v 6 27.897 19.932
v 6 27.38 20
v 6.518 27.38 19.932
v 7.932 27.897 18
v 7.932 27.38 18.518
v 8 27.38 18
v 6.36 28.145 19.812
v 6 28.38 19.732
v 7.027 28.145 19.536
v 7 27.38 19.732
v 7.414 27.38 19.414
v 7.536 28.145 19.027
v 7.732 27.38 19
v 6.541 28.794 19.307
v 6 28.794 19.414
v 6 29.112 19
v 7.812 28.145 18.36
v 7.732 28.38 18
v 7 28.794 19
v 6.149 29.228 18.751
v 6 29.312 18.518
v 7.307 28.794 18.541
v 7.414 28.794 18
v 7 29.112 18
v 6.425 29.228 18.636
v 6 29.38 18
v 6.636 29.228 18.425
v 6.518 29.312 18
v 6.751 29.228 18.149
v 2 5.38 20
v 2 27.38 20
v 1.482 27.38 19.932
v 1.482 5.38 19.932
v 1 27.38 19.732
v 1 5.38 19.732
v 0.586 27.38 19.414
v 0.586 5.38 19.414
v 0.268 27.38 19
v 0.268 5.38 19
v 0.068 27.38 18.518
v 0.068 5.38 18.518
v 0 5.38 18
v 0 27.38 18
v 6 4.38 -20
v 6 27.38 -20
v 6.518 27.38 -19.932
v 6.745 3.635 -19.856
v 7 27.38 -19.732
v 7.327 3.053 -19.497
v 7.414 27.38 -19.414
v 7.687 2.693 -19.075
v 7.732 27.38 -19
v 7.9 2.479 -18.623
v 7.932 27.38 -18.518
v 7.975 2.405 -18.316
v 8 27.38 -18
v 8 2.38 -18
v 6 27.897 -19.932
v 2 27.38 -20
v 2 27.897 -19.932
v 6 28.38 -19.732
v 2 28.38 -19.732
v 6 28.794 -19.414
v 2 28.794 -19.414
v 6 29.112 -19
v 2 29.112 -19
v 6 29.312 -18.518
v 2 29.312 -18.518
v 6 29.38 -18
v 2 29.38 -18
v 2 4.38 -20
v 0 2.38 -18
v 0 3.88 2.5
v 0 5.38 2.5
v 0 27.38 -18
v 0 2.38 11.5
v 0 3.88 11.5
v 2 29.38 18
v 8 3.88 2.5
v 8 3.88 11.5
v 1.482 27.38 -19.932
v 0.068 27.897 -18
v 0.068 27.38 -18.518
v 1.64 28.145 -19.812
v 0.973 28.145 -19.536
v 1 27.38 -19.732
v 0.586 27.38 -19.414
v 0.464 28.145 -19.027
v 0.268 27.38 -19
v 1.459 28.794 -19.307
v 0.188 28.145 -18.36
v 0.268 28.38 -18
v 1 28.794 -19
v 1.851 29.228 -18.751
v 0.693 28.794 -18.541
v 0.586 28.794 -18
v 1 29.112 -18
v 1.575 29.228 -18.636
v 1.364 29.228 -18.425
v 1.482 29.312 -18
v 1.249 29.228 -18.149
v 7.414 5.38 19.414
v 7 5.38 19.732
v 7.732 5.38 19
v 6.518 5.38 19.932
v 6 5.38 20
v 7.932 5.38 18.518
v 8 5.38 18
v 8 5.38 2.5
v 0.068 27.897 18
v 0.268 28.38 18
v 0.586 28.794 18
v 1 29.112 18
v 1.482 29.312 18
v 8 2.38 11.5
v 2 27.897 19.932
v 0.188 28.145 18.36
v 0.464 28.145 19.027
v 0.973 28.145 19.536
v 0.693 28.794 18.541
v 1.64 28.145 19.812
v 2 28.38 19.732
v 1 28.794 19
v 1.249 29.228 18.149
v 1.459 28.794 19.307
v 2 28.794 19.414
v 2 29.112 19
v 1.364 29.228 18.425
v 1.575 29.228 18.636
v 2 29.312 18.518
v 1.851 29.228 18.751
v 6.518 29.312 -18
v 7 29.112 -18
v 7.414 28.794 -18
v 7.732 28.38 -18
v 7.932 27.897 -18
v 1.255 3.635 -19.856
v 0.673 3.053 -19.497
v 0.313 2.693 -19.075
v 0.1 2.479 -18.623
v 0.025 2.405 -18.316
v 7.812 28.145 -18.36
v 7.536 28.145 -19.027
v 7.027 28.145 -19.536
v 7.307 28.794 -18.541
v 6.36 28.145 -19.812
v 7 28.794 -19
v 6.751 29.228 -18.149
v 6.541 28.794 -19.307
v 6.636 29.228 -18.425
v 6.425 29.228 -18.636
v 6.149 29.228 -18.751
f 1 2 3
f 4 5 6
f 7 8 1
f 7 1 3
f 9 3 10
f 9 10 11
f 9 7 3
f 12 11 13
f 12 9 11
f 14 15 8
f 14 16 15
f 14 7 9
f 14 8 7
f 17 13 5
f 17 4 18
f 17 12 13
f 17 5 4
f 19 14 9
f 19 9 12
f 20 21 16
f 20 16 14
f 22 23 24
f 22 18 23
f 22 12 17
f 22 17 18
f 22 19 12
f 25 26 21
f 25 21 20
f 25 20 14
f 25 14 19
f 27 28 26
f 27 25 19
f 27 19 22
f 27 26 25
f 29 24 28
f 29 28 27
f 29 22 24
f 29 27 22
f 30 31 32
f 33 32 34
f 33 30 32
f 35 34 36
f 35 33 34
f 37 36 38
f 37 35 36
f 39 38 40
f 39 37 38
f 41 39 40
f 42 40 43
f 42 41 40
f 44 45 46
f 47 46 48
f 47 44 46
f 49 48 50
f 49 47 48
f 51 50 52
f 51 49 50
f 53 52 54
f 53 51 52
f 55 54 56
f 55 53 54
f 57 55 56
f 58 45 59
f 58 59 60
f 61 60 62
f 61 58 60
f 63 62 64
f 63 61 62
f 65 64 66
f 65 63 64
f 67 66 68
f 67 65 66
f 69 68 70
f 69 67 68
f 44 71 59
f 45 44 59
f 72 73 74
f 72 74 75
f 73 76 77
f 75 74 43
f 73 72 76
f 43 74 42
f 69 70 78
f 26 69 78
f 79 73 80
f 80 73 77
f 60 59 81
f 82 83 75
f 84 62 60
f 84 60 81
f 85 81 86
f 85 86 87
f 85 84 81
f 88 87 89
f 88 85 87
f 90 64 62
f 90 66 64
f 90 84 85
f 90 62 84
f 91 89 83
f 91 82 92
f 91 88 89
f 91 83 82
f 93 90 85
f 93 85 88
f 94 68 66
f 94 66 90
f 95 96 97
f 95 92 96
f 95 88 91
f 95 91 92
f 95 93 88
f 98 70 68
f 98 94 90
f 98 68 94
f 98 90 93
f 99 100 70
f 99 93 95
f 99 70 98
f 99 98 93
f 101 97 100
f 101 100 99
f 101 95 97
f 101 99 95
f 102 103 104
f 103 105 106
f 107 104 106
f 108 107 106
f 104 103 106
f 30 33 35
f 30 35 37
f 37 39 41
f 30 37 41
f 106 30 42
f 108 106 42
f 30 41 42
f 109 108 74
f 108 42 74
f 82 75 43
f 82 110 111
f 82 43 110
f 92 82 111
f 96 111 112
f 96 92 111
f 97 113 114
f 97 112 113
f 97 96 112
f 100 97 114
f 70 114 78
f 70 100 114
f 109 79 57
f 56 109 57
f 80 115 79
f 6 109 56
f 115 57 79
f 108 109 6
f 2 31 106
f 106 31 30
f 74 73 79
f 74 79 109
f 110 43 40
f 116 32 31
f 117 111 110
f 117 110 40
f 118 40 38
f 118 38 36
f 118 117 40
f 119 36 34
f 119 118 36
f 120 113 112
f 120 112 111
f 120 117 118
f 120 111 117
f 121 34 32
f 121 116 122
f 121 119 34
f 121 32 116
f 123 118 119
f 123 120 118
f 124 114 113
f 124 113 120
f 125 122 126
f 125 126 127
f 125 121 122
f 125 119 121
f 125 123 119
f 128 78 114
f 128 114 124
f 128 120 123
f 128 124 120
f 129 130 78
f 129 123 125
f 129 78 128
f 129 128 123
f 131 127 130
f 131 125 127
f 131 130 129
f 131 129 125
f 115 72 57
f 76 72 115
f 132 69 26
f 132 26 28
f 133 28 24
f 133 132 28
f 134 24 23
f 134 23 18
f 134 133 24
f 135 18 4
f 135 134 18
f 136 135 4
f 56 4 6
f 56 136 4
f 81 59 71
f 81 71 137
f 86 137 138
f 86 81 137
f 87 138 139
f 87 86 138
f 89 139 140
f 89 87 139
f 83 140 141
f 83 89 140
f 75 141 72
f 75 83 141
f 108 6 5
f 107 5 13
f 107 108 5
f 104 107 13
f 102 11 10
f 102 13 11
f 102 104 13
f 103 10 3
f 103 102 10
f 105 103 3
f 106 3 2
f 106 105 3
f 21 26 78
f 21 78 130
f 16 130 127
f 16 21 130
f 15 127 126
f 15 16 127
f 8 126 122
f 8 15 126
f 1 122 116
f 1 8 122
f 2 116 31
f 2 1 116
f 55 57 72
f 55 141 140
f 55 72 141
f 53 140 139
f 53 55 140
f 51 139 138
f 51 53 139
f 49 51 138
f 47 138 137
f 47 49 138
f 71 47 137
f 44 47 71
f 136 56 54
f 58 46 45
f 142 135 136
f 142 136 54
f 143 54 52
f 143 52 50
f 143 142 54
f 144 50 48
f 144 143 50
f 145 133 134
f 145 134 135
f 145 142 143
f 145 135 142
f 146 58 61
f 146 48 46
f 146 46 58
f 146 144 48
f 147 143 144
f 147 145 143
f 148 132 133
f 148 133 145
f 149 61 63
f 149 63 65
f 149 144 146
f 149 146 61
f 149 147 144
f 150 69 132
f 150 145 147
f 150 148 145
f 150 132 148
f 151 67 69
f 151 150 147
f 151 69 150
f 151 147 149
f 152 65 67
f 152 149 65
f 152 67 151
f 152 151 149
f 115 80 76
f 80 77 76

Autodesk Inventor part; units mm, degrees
ref_plane "YZ Plane" through (0, 0, 0) normal (1, 0, 0) x (0, 1, 0)
ref_plane "XZ Plane" through (0, 0, 0) normal (0, 1, 0) x (-1, 0, 0)
ref_plane "XY Plane" through (0, 0, 0) normal (0, 0, 1) x (1, 0, 0)
sketch "Sketch1" plane through (0, 0, 0) normal (1, 0, 0) x (0, 1, 0)
  line L0 (29.3798, 20) -> (5.3798, 20)
  line L1 (5.3798, 20) -> (5.3798, -20)
  line L2 (5.3798, -20) -> (29.3798, -20)
  line L3 (29.3798, -20) -> (29.3798, 20)
  line L4 (5.3798, -20) -> (2.3798, -20)
  line L5 (2.3798, -20) -> (2.3798, 2.5)
  line L6 (2.3798, 2.5) -> (5.3798, 2.5)
  line L7 (5.3798, 2.5) -> (5.3798, -20)
  line L8 (2.3798, 2.5) -> (3.8798, 2.5)
  line L9 (3.8798, 2.5) -> (3.8798, 11.5)
  line L10 (3.8798, 11.5) -> (2.3798, 11.5)
  line L11 (2.3798, 11.5) -> (2.3798, 2.5)
  point P0 (0, 0)
  point P1 (5.3798, 0)
  dimension "d0" = 24
  dimension "d1" = 40
  dimension "d2" = 3
  dimension "d3" = 22.5
  dimension "d4" = 1.5
  dimension "d5" = 9
extrude "Extrusion1" add sketch "Sketch1" along normal blind 8
fillet "Fillet1" radius 2 7 edges at (0, 17.3798, 20) (8, 17.3798, 20) (0, 15.8798, -20) (8, 15.8798, -20) (4, 2.3798, -20) (4, 29.3798, -20) (4, 29.3798, 20)
fillet "Fillet2" radius 2 6 edges at (7.4142, 28.794, 19.4142) (7.4142, 28.794, -19.4142) (8, 29.3798, 0) (0.5858, 28.794, 19.4142) (0.5858, 28.794, -19.4142) (0, 29.3798, 0)
properties part number "GATE servo motor"
